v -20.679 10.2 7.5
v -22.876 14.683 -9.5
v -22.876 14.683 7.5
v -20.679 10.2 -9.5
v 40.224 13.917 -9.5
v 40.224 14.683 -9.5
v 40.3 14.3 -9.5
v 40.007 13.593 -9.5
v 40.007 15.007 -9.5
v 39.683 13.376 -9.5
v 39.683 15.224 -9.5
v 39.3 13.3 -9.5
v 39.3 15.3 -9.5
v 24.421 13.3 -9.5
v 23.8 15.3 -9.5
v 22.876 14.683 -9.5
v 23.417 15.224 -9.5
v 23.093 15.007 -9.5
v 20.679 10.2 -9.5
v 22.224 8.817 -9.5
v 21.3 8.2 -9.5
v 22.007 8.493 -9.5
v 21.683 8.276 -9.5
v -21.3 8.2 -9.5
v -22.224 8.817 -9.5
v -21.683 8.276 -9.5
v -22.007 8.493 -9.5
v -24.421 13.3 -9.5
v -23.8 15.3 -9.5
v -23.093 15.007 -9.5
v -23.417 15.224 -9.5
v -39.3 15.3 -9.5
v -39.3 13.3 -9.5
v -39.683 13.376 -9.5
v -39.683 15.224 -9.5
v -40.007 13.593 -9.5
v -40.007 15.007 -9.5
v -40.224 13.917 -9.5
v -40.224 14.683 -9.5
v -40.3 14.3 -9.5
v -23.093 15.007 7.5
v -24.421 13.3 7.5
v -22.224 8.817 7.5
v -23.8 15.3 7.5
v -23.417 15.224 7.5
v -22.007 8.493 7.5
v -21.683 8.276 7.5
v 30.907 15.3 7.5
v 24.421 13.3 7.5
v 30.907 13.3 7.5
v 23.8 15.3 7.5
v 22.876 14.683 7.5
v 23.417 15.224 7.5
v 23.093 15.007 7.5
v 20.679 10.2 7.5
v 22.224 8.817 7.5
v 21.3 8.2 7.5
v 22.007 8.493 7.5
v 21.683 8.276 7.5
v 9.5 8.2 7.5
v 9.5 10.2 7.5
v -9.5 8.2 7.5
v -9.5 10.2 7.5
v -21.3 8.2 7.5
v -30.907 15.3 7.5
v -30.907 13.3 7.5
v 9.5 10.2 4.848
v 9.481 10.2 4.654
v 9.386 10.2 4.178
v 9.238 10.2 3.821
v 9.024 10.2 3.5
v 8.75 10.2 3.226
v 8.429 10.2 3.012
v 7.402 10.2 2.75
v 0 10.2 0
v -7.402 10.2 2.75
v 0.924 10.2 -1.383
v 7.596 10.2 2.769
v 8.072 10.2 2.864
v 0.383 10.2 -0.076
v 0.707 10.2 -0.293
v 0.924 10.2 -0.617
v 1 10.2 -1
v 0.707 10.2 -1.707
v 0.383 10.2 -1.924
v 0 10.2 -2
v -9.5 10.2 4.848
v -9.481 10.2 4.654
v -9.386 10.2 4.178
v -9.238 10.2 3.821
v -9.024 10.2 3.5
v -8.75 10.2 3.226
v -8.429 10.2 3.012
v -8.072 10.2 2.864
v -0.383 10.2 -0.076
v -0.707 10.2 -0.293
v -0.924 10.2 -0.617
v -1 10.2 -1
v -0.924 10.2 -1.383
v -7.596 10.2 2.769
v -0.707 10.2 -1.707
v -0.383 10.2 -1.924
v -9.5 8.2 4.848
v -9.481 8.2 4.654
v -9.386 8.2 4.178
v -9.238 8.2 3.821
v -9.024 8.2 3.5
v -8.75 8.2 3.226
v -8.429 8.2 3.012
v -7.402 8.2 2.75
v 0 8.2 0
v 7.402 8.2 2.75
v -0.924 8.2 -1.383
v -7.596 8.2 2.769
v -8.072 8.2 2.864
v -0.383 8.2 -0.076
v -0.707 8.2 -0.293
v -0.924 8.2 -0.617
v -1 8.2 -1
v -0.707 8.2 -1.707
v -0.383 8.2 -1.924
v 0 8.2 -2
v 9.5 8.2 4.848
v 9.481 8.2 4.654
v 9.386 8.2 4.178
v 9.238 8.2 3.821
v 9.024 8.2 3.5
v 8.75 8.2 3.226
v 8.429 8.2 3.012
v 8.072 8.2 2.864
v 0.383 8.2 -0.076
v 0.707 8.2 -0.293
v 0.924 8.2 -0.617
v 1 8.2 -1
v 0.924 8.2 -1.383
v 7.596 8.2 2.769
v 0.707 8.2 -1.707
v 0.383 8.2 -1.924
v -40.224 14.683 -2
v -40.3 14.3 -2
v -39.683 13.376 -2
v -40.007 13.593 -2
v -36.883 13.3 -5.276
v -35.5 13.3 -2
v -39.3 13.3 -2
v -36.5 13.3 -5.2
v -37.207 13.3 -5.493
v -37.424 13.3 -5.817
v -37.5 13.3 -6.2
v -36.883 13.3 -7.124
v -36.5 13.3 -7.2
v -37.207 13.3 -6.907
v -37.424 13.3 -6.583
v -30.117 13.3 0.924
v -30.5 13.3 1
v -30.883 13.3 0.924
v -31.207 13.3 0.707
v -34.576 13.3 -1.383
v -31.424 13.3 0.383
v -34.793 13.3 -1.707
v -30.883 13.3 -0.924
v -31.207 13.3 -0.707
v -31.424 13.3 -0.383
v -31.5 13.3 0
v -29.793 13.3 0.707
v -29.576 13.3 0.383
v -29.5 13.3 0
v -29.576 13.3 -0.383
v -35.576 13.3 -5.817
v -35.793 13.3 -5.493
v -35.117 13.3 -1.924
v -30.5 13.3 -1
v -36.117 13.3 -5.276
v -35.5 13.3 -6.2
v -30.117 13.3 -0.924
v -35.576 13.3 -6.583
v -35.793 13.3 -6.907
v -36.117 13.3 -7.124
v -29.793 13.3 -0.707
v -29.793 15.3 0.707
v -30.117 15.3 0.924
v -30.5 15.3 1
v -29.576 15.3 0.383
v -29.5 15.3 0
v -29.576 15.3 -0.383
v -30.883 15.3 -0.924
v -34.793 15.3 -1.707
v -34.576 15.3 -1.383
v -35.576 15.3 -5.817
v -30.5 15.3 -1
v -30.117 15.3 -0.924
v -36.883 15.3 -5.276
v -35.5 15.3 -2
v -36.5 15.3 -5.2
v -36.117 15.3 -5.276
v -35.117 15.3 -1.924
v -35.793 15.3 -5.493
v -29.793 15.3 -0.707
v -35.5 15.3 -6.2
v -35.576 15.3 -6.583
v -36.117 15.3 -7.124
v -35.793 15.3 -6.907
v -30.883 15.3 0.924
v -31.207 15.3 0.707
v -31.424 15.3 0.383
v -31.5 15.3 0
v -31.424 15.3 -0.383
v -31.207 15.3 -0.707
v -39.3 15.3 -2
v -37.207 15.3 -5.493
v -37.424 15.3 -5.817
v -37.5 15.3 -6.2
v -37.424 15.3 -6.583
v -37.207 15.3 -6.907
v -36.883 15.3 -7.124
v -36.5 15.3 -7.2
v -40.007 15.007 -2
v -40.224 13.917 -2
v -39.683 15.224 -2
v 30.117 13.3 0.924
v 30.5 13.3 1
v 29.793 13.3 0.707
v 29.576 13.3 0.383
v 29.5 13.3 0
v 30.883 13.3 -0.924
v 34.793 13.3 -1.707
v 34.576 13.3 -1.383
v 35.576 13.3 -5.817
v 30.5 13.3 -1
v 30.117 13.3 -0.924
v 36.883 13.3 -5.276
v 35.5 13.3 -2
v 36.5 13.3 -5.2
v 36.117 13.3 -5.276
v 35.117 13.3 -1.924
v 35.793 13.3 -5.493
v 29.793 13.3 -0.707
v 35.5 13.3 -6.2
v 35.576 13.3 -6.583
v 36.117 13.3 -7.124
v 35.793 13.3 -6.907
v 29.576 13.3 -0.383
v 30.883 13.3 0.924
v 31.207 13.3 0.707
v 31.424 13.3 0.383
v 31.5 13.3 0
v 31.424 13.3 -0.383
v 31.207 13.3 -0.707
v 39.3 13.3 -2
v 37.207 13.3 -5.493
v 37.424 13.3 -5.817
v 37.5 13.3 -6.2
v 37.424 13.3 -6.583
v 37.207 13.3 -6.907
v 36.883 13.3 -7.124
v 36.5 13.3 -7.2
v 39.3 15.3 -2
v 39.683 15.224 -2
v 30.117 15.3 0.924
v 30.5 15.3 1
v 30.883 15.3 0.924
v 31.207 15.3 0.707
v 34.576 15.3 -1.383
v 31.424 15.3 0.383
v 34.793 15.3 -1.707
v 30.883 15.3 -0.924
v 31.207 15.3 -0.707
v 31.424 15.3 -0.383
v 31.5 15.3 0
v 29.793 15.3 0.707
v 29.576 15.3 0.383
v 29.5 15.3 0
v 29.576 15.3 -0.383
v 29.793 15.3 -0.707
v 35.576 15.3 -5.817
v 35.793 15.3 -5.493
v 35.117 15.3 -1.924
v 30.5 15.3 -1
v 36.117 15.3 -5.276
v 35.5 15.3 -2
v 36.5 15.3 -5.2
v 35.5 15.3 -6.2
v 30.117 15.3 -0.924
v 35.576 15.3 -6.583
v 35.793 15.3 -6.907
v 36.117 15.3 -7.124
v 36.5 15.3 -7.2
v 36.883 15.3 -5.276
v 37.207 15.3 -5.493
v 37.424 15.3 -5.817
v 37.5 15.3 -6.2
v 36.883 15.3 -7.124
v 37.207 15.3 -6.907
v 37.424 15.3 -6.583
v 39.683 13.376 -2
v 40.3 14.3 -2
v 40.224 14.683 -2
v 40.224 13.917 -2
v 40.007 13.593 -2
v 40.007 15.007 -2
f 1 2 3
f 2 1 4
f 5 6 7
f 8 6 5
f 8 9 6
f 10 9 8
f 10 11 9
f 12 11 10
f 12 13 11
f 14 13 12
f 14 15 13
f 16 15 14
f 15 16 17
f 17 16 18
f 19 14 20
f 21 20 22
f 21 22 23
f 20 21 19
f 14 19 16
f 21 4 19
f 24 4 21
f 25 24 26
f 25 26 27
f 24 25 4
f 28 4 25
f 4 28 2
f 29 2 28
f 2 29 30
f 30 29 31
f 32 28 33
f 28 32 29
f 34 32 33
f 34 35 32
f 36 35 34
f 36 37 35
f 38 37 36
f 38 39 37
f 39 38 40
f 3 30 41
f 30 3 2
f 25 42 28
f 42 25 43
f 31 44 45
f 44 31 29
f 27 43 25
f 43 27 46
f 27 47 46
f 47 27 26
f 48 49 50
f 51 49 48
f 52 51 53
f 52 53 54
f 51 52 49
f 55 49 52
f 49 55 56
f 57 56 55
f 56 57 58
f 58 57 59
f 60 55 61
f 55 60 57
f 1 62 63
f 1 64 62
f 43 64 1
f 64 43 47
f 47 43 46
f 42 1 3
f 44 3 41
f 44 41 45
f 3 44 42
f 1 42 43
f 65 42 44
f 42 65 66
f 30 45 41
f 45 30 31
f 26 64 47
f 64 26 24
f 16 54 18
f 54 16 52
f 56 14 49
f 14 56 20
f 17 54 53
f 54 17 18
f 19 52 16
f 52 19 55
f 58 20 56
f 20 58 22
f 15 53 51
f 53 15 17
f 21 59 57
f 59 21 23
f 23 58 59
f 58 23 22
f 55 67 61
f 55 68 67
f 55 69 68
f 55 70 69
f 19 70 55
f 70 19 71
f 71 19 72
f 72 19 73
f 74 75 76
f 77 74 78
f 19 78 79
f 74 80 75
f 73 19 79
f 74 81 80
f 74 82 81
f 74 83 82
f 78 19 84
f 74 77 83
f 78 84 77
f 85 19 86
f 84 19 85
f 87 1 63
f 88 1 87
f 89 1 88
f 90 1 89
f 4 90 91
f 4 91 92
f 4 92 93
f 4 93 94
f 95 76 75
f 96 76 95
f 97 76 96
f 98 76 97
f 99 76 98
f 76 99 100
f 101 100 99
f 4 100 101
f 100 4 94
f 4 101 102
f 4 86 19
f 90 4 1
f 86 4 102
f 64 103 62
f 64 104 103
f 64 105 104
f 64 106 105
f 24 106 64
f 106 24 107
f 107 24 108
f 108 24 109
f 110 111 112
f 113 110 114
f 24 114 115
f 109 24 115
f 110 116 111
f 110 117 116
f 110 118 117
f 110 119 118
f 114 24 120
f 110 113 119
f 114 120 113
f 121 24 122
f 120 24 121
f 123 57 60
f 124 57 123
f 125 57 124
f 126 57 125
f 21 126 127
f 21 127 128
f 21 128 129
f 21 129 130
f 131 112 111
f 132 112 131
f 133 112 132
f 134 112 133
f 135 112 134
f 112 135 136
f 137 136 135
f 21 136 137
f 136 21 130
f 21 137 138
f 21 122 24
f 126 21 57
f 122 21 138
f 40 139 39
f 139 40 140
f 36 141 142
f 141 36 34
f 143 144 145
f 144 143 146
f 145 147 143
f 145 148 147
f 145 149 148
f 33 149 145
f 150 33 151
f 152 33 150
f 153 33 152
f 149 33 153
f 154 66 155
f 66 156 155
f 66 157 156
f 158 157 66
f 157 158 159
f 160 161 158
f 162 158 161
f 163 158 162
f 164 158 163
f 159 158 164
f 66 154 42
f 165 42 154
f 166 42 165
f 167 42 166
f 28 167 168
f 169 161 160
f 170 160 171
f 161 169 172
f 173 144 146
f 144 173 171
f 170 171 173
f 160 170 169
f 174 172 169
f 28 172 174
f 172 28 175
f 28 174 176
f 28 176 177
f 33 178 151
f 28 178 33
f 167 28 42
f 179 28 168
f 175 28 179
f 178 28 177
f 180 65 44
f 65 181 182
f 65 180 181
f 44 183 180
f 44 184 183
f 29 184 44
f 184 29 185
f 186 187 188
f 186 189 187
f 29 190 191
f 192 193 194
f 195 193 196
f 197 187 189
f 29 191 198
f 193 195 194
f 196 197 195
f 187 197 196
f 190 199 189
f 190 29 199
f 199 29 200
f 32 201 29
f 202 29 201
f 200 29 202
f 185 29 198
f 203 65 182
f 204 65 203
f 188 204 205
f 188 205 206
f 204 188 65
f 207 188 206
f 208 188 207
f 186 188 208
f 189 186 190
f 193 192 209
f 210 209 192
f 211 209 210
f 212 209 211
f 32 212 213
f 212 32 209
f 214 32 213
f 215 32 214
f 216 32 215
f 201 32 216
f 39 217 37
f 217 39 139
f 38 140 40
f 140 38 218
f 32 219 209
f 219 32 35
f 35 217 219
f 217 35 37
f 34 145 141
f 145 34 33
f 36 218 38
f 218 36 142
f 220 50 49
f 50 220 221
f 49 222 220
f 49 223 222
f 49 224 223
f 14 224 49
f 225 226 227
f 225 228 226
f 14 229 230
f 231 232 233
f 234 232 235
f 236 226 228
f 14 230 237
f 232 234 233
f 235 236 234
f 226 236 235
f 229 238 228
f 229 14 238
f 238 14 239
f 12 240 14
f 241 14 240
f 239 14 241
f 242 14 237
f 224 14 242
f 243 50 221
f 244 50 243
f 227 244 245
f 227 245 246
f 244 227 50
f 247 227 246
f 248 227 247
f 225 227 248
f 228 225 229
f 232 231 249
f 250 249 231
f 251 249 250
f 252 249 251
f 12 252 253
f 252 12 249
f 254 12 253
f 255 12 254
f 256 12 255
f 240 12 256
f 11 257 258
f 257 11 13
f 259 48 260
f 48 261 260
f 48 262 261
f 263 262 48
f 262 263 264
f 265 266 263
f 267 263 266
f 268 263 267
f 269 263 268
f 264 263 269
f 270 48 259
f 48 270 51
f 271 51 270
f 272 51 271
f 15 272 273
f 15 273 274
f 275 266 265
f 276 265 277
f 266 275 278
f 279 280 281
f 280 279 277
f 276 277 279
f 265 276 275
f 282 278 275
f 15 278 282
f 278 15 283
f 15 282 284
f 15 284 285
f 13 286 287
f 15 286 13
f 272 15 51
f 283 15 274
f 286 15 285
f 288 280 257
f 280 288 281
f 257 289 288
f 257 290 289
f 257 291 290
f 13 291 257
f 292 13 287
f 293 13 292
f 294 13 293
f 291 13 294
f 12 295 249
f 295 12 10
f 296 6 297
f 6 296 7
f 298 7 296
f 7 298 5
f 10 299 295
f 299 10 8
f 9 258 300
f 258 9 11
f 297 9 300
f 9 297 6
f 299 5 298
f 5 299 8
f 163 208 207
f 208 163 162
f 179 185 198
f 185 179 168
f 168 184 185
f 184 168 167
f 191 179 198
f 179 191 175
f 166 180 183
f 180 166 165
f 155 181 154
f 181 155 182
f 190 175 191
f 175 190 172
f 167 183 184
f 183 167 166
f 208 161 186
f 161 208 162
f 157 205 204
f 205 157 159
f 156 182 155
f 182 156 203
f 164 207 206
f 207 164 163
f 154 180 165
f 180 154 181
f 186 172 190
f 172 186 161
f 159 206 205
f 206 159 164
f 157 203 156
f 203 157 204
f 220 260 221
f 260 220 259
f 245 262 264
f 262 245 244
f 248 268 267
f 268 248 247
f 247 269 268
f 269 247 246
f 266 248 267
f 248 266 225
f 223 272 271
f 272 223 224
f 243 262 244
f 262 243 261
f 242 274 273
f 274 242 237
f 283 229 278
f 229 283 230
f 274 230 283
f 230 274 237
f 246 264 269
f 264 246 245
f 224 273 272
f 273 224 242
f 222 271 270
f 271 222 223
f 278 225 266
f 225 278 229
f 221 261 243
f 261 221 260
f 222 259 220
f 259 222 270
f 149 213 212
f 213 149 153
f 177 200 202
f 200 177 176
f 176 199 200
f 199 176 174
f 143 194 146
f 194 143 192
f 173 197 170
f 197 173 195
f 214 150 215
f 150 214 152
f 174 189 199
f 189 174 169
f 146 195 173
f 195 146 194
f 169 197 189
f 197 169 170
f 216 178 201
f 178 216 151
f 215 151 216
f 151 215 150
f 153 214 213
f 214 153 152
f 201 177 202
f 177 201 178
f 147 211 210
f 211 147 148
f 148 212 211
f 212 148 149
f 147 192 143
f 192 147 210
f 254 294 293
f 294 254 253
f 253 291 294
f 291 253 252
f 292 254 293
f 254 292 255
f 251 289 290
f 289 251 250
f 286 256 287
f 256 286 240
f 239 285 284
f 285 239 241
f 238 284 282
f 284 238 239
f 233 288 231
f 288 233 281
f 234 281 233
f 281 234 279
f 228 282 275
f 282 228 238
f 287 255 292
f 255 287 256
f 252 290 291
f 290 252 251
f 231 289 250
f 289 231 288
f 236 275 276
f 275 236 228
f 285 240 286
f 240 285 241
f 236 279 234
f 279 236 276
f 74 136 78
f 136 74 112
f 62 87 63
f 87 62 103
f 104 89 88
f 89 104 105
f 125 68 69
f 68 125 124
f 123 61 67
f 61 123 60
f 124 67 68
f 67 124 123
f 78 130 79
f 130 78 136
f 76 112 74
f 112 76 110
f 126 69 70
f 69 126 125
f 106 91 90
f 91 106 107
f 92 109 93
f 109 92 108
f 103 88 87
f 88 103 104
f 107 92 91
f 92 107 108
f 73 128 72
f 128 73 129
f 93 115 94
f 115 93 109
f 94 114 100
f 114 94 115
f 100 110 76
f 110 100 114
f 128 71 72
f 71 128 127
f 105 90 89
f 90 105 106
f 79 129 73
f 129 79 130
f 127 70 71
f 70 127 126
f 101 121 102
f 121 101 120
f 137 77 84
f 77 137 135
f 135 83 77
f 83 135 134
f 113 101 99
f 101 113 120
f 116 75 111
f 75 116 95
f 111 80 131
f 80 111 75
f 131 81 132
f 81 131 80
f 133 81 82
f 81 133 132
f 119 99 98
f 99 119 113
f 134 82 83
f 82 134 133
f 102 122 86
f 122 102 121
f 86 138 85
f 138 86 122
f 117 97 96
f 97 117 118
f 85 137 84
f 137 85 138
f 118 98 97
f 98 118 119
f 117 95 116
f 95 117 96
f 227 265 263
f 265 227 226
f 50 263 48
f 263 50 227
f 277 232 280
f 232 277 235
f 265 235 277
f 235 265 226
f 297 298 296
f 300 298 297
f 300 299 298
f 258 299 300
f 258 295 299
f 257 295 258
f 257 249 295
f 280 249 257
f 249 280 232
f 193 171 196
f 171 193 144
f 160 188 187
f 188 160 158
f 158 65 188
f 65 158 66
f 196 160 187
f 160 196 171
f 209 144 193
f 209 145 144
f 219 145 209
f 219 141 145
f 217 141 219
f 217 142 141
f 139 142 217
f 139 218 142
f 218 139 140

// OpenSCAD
//lol-bbbbsupport

$fn=16;

//button board bracket clearance
bbcz=6.4;

//slot clearance
slcz=8.2;





// Mounting Posts Case
// Diameter
cmd=7.6;
// Height
cmz=13.3;
// OffsetY
cmoy=2.7+.5;
// OffsetX
cmox=74-1;
// Hole Diameter
cmhd=2;

// Mounting Posts PCB
// Diameter
pmd=4.2;
// Height
pmz=13.3;
// OffsetY
pmoy=-4+1;
// OffsetX
pmox=62-1;
// Hole Diameter
pmhd=2;


//Post Y Distance 
//12.6 - 4.2/2 - 7.6/2
//12.6 - 2.1 - 3.8
//12.6 - 5.9
// 6.7

// Width measured 58.5mm 
OuterW=58;
// W
LatchW=19;
// Detpth measured .7mm
LatchD=1;
NotchW=53;
NotchX=OuterW-NotchW;

latchcx=14;

// H measured at 11.8mm
notchh=11.5;
// Thickness measured 2.2mm
notcht=2.4;
notchy=3.75;

// Other Parameters
//main thickness
pt=2;

//post offset y
poy=6.7;

//overall y dimension
oy=17;

//translate([0,3,0])
//mounting_posts();
//walls();
//translate([0,0,0])
//import("lol-backbuttonboardbracket.stl");

module walls() {
for (x=[-OuterW/2-notcht/2:OuterW+notcht:OuterW/2+notcht/2])
translate([x,0,pmz/2])
cube([notcht, 20, pmz], center=true);
}

module connector_cut() {
    hull() {
    translate([cmox/2+10,0,0])
    cylinder(d=2,h=pmz+pt);
    translate([cmox/2-1,0,0])
    cylinder(d=2,h=pmz+pt);
    translate([cmox/2-notchh/2,-notchh,0])
    cylinder(d=2,h=pmz+pt);
    translate([cmox/2+10,-notchh,0])
    cylinder(d=2,h=pmz+pt);
    }
}


module notch_cut2() {
    translate([0,-notchy*2,slcz])
    cheese(LatchW,3.75*2,pt,2);

}
//notch cut
//notch_cut();
module notch_cut(){
    hull(){
    
    translate([0,-oy/2+notchy/2,0]){
        translate([-latchcx/2,0,0])
        cylinder(d=notchy, h=pmz);
        translate([latchcx/2,0,0])
        cylinder(d=notchy, h=pmz);
    }
    translate([0,-oy/2-notchy/2,0]){
        translate([-LatchW/2,0,0])
        cylinder(d=notchy, h=pmz);
        translate([LatchW/2,0,0])
        cylinder(d=notchy, h=pmz);
    }

    }
}

module screw_cut(){
translate([0,1,0])
cylinder(d=2, h=pmz);
//    hull(){
//    
//    translate([0,-oy/2+notchy/2+4,0]){
//        translate([-latchcx/2+4,0,0])
//        cylinder(d=notchy, h=pmz);
//        translate([latchcx/2-4,0,0])
//        cylinder(d=notchy, h=pmz);
//    }
//    translate([0,-oy/2-notchy/2+4,0]){
//        translate([-LatchW/2+4,0,0])
//        cylinder(d=notchy, h=pmz);
//        translate([LatchW/2-4,0,0])
//        cylinder(d=notchy, h=pmz);
//    }
//
//    }
}


//mounting post stand ins
module mounting_posts() {
    //PCB Mount posts
    //left
    translate([-pmox/2, pmoy, 0])
    cylinder(d=pmd, h=pmz);
    //right
    translate([pmox/2, pmoy, 0])
    cylinder(d=pmd, h=pmz);

    //Case Mount posts
    //left
    translate([-cmox/2, cmoy, 0])
    cylinder(d=cmd, h=cmz);
    //right
    translate([cmox/2, cmoy, 0])
    cylinder(d=cmd, h=cmz);
}

//mounting_holes();
module mounting_holes() {
    //PCB Mount posts
    //left
    translate([-pmox/2, pmoy, 0])
    cylinder(d=pmhd, h=pmz+pt);
    //right
    translate([pmox/2, pmoy, 0])
    cylinder(d=pmhd, h=pmz+pt);

    //Case Mount posts
    //left
    translate([-cmox/2, cmoy, 0])
    cylinder(d=cmhd, h=cmz+pt);
    //right
    translate([cmox/2, cmoy, 0])
    cylinder(d=cmhd, h=cmz+pt);
}

//print orientation
rotate([-90,0,0])
translate([0,1,0])
final_part();
module final_part() {
difference() {
    base_bracket();
    notch_cut2();
translate([0,-1,0])
    screw_cut();
    translate([0,2,0])
    mounting_holes();
    connector_cut();
mirror() connector_cut();
    
    
}
}
//base_bracket();
module base_bracket() {
union() {
    left_side();
    right_side();
    bottom_part();
    top_left();
    top_right();

}
}

//bottom part
module bottom_part() {
    hull() {
        //bottom right
        node(pmox/2-pmd-NotchX,0,pt/2+slcz);
        //bottom left
        node(-pmox/2+pmd+NotchX,0,pt/2+slcz);
    }
}

//left side part
module left_side(){
    hull() {
    //top inside left
    node(-pmox/2+pmd+NotchX/2,0,pmz+pt/2);
    //bottom left
    node(-pmox/2+pmd+NotchX,0,pt/2+slcz);
    }
}

//right side part
module right_side(){
    hull() {
    //top right
    node(pmox/2-pmd-NotchX/2,0,pmz+pt/2);
    //bottom right
    node(pmox/2-pmd-NotchX,0,pt/2+slcz);
    }
}

module top_left() {
    hull() {
    //top outside left
    node(-cmox/2-cmd/2+1,0, cmz+pt/2);
    //top inside left
    node(-pmox/2+pmd+NotchX/2,0,pmz+pt/2);
    }
}

//translate([0,0,0])
//#hull() {
//    translate([-pmox/2, pmoy, pmz])
//    color("red") cylinder(d=pmd, h=pt);
//
//    translate([-cmox/2, cmoy, cmz])
//    color("red") cylinder(d=cmd, h=pt);
//
//    node(-pmox/2+pmd+NotchX/2,0,pmz+pt/2);
//}

//translate([0,3,0])
//flap_mount();
//mounting_holes();
module mounting_holes() {
    //PCB Mount posts
    //left
    translate([-pmox/2, pmoy, 0])
    cylinder(d=pmhd, h=pmz+pt);
    //right
    translate([pmox/2, pmoy, 0])
    cylinder(d=pmhd, h=pmz+pt);

    //Case Mount posts
    //left
    translate([-cmox/2, cmoy, 0])
    cylinder(d=cmhd, h=cmz+pt);
    //right
    translate([cmox/2, cmoy, 0])
    cylinder(d=cmhd, h=cmz+pt);
}

module flap_left() {
    hull() {
        //pcb
        //left
        translate([-pmox/2, pmoy+3, pmz])
        cylinder(d=pmd, h=pt);
        //angle
        translate([-pmox/2, -oy/2+pmd/2+1, pmz])
        #cylinder(d=pmd, h=pt);
        
        //case
        //left
        translate([-cmox/2, cmoy+3, pmz])
        cylinder(d=cmd, h=pt);
        //top inside left
        node(-pmox/2+pmd+NotchX/2,1,pmz+pt/2);
    }
}
module top_right() {
    hull() {
    //top outside left
    node(cmox/2+cmd/2-1,0, cmz+pt/2);
    //top inside left
    node(pmox/2-pmd-NotchX/2,0,pmz+pt/2);
    }
}

module node(x,y,z) {
    translate([x,y,z]){
        rotate([90,0,0])
        translate([0,0,-oy/2])
        cylinder(h=oy, d=pt);
        } // end translate wrapper
}

module cheese(x,y,z,r) {
linear_extrude(height=z) offset(-r) offset(r) offset(r) offset(-r)
    square([x,y], center=true);
}
